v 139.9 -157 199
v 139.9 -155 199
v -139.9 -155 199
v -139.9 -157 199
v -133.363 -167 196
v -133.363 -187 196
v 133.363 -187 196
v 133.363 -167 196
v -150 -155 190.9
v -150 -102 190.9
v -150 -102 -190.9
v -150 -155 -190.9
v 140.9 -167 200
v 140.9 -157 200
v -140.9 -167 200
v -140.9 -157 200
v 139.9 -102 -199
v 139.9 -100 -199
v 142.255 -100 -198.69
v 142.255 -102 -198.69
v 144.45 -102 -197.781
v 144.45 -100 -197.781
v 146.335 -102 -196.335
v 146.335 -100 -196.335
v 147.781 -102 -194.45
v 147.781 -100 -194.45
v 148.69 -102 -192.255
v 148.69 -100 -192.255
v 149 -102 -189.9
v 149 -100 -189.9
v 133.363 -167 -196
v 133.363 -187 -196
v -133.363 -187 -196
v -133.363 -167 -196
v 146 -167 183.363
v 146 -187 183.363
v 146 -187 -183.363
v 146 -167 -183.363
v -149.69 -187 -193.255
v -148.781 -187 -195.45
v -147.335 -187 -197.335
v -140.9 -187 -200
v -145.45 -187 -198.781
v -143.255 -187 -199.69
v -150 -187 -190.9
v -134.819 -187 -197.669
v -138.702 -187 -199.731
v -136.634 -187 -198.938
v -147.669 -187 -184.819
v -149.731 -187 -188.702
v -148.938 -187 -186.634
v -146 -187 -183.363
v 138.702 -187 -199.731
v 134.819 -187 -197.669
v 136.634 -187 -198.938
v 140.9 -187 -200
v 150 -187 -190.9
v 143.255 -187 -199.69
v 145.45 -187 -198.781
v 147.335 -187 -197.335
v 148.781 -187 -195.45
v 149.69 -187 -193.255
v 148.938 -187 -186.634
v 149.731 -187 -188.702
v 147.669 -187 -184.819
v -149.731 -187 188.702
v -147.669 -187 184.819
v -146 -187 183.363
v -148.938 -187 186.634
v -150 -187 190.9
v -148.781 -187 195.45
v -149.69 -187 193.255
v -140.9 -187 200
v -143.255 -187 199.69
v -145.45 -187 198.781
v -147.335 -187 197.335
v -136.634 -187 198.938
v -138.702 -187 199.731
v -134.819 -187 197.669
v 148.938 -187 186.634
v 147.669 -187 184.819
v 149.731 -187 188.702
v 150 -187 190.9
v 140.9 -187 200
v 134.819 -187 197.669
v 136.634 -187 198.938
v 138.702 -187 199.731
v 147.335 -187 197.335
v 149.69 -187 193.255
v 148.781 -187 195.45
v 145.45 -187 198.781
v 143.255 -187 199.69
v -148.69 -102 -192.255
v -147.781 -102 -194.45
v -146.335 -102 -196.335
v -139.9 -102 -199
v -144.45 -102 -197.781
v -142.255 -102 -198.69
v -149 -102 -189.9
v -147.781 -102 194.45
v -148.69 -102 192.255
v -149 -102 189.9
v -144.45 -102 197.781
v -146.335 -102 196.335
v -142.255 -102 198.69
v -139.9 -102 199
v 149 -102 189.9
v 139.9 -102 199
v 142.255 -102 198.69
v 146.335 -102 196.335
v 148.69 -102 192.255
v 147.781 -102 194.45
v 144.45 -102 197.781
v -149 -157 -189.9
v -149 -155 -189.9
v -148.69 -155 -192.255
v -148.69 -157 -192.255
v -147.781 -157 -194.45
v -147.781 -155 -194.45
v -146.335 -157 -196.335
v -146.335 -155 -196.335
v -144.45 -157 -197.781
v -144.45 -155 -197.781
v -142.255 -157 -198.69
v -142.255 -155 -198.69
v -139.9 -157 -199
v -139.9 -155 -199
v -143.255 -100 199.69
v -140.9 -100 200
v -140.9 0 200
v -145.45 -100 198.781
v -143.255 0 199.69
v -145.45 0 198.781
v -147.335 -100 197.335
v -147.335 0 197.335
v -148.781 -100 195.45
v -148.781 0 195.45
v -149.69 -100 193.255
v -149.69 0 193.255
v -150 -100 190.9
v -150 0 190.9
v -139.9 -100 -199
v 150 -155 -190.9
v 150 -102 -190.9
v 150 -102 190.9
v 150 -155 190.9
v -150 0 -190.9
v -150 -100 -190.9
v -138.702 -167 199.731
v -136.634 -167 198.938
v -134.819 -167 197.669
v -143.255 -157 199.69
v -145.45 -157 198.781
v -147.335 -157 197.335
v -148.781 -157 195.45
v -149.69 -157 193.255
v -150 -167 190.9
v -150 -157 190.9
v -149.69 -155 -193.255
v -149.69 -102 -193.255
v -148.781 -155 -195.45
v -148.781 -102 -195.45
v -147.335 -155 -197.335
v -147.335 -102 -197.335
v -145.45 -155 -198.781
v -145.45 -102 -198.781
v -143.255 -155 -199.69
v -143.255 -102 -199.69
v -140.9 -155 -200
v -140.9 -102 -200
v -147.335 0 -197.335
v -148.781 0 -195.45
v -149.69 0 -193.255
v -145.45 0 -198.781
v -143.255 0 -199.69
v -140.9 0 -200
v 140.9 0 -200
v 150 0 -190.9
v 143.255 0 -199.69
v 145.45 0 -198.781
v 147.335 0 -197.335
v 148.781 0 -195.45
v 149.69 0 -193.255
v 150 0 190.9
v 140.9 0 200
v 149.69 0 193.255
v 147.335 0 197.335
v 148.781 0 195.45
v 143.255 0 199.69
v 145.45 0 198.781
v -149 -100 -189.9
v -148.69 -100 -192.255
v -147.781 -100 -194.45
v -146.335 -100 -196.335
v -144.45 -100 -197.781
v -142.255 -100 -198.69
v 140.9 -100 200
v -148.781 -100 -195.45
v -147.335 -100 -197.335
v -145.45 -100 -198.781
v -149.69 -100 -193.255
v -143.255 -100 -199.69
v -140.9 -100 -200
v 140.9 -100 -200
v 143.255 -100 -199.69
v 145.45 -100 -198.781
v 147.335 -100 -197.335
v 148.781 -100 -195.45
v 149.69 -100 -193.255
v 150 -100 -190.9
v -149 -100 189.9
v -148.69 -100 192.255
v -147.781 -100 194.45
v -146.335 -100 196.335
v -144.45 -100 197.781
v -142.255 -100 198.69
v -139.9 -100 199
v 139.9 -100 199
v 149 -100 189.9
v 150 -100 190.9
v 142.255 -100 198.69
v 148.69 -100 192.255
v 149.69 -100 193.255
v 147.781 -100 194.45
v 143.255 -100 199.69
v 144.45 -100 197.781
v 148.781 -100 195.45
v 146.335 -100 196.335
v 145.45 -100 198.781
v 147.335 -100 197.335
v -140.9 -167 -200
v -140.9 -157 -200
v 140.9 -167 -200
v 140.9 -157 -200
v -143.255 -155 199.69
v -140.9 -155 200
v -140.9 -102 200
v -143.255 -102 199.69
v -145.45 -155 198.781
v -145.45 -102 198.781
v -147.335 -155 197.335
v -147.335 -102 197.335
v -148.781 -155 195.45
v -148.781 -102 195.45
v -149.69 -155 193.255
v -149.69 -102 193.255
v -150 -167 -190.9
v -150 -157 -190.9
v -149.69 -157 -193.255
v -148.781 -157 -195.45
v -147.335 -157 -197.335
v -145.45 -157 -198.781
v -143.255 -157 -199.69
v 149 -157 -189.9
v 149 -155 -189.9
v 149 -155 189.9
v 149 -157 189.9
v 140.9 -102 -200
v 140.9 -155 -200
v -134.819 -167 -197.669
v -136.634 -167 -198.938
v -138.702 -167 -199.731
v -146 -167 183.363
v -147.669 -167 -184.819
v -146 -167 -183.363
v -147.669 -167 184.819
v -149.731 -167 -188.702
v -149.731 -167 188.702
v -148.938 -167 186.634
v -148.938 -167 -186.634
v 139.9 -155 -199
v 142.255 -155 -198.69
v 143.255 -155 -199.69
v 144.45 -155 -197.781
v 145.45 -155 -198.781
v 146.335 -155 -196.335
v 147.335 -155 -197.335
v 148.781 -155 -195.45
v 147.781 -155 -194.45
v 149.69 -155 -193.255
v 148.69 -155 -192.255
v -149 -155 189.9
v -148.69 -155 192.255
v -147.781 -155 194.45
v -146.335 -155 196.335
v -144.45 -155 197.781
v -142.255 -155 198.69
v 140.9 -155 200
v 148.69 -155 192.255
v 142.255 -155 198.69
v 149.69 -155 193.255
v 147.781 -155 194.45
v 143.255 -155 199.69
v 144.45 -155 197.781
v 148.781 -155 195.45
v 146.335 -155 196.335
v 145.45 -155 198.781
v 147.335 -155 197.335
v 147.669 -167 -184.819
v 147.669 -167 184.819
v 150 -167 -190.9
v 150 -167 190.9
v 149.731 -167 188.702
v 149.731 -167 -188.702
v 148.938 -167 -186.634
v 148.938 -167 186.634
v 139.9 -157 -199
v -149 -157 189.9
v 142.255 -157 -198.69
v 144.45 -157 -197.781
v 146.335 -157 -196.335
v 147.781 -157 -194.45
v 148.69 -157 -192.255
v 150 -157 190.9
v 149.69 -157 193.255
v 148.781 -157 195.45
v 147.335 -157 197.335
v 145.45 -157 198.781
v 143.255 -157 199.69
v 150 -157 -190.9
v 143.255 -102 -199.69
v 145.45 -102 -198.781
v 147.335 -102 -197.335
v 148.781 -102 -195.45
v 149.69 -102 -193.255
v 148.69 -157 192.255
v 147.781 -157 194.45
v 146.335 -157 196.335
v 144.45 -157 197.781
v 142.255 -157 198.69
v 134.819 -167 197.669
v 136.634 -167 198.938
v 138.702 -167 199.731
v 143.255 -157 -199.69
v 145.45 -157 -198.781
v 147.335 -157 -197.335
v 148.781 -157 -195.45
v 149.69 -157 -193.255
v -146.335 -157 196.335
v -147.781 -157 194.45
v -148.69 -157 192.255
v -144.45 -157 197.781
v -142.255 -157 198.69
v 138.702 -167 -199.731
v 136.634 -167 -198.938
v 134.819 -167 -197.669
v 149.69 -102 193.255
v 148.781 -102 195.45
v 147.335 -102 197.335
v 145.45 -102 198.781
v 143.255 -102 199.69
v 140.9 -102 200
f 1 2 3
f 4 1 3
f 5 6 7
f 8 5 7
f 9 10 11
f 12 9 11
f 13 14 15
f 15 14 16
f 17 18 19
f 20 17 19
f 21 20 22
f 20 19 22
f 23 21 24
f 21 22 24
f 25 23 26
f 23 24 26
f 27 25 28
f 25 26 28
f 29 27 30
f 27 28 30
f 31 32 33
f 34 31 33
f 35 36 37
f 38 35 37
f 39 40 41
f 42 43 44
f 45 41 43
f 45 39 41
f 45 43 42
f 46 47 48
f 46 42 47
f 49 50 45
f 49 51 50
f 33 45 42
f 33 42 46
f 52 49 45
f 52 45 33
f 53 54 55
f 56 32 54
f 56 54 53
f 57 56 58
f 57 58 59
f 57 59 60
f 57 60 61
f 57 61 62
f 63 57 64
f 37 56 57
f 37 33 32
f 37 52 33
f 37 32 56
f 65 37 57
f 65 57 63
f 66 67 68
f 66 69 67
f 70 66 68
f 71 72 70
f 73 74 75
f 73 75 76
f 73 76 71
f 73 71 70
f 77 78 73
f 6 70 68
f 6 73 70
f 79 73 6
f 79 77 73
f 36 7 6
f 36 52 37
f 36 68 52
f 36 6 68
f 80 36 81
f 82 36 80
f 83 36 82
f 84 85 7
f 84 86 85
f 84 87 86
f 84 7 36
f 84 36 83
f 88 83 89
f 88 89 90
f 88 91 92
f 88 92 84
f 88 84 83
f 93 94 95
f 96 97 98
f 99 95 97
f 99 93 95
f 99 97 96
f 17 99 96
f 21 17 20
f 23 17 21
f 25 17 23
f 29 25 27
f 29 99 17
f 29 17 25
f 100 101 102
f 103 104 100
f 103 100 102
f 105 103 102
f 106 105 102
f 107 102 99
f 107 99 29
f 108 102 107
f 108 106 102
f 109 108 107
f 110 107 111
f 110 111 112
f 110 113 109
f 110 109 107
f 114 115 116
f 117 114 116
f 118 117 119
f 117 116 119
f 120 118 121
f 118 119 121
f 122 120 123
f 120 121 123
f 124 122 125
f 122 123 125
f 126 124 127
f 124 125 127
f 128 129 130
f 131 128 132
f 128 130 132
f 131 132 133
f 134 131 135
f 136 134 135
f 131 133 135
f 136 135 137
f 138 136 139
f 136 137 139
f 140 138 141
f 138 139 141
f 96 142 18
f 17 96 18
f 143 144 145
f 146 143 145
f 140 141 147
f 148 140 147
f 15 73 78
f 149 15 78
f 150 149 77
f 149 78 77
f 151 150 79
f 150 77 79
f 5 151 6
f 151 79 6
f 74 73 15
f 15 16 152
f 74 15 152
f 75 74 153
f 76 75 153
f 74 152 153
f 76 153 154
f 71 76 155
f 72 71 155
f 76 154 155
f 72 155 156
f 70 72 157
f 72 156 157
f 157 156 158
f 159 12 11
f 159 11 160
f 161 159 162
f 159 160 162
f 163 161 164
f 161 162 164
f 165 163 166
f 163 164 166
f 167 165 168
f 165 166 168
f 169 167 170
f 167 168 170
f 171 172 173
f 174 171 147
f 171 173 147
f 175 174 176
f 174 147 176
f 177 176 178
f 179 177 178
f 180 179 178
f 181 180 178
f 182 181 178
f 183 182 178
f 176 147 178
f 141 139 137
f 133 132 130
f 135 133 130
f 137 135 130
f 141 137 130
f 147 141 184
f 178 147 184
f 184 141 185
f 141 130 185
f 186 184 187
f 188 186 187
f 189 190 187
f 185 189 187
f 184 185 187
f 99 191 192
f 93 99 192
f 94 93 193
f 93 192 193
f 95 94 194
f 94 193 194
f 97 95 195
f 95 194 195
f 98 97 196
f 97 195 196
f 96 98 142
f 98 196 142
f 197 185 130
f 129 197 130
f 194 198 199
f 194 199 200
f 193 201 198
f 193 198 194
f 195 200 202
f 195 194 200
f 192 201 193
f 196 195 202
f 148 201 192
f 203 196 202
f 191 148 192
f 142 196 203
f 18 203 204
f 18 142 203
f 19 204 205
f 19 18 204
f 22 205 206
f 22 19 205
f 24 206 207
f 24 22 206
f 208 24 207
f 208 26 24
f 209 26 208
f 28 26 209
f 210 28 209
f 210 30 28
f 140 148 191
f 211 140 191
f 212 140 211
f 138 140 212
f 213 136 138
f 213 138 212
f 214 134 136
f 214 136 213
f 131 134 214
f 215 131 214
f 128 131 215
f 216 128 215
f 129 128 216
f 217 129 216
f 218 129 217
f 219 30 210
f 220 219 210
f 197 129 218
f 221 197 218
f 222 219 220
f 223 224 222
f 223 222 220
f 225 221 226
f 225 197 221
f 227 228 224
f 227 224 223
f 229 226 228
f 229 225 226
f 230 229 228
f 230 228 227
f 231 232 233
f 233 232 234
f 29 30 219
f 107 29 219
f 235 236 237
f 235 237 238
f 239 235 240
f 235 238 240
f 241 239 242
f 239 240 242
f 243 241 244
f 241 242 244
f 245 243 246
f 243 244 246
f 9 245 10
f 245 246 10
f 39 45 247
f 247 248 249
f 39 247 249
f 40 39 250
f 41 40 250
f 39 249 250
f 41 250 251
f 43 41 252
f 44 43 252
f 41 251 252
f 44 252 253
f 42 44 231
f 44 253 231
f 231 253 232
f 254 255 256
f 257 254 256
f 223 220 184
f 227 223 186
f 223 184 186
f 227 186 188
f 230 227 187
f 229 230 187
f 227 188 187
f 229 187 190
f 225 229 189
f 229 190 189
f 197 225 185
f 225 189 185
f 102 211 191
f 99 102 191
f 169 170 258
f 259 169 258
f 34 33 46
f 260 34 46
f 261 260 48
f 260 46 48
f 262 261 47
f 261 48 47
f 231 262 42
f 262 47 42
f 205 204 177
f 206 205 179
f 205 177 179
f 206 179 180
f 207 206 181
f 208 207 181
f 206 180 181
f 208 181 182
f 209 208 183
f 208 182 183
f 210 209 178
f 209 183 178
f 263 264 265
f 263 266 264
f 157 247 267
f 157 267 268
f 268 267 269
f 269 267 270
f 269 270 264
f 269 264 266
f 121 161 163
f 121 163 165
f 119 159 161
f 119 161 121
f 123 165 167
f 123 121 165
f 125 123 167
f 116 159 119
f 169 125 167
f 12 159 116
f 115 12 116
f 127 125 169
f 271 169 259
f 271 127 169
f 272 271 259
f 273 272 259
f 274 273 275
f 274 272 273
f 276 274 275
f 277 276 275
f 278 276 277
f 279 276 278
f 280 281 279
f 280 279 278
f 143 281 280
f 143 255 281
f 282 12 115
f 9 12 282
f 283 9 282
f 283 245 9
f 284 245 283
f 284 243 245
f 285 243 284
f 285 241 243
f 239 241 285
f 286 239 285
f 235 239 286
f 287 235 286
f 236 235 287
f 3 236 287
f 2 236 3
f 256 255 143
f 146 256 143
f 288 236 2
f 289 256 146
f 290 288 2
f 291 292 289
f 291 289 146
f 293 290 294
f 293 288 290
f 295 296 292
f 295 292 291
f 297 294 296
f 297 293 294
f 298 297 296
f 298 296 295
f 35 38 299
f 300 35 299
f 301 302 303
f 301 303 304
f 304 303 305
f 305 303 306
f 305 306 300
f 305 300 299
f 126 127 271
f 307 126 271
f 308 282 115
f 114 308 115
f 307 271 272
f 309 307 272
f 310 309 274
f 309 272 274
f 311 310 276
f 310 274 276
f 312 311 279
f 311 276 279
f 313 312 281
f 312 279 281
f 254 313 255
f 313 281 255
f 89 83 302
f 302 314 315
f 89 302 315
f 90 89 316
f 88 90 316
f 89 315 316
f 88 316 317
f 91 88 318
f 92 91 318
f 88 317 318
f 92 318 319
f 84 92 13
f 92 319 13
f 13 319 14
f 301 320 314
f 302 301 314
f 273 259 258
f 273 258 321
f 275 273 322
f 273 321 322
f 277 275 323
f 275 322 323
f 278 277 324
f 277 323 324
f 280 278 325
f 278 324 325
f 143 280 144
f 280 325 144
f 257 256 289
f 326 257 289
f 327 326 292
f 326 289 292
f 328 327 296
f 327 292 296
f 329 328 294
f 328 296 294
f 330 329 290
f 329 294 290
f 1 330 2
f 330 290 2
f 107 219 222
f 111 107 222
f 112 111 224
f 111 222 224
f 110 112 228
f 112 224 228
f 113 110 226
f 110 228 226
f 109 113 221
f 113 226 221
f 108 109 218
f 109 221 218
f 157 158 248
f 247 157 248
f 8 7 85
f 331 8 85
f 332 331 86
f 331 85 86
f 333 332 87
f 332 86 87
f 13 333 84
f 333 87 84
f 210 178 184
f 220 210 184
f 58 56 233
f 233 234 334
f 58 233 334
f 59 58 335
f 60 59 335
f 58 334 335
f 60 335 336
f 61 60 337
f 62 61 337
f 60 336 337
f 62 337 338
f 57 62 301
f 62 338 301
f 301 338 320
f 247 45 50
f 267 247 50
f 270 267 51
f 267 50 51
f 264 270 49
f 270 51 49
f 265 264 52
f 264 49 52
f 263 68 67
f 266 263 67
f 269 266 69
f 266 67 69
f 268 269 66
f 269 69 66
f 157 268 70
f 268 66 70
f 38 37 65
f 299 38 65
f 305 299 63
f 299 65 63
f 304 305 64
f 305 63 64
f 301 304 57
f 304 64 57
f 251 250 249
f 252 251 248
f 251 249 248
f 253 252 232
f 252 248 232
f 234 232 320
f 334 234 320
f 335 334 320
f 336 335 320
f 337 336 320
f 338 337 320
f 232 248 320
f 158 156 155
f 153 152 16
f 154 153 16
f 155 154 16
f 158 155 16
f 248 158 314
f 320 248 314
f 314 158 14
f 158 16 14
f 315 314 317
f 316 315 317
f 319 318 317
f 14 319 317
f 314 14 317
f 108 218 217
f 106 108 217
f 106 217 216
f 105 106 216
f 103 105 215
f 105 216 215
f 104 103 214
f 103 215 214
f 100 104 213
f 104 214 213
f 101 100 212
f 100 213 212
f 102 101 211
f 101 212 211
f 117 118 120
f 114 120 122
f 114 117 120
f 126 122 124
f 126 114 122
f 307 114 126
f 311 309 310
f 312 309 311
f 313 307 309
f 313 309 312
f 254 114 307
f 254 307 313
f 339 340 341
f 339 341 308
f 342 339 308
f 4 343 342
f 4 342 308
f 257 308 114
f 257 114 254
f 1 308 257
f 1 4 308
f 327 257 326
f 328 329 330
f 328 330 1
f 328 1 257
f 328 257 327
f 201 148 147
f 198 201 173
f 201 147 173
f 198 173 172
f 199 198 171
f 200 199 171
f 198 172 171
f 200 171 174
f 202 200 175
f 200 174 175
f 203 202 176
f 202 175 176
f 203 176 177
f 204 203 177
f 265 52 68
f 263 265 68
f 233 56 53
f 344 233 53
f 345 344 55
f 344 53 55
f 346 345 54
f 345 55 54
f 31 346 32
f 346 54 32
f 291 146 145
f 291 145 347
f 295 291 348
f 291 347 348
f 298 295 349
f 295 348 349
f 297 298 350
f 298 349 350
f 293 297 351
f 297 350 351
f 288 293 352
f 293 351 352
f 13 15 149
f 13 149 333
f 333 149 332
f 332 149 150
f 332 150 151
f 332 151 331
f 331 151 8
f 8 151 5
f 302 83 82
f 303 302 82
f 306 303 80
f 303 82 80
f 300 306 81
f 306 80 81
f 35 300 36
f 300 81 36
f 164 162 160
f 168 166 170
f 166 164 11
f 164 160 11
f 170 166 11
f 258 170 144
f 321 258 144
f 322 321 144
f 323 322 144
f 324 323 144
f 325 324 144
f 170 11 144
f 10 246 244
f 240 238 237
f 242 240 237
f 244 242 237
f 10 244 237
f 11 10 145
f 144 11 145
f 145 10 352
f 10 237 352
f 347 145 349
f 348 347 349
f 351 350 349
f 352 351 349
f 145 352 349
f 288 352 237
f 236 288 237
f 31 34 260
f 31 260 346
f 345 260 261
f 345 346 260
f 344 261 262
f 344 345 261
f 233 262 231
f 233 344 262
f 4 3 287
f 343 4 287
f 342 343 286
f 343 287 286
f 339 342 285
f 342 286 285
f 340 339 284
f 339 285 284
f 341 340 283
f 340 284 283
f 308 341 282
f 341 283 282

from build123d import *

# Parameters (mm, degrees)
F1_DEPTH  = 100
F3_DEPTH  = 2
F5_DEPTH  = 53
F7_DEPTH  = 2
F8_W      = 290
F8_H      = 390
F9_DEPTH  = 30
F11_DEPTH = 20


with BuildPart() as f1:
    # F0 (on Front) → F1 (new body)
    with BuildSketch(Plane.XZ):
        with BuildLine():
            Line((140.9, 200), (-140.9, 200))
            ThreePointArc((-140.9, 200), (-147.334672, 197.334672), (-150, 190.9))
            Line((-150, 190.9), (-150, -190.9))
            ThreePointArc((-150, -190.9), (-147.334672, -197.334672), (-140.9, -200))
            Line((-140.9, -200), (140.9, -200))
            ThreePointArc((140.9, -200), (147.334672, -197.334672), (150, -190.9))
            Line((150, -190.9), (150, 190.9))
            ThreePointArc((150, 190.9), (147.334672, 197.334672), (140.9, 200))
        make_face()
    extrude(amount=F1_DEPTH)

    # F2 (on face) → F3 (join)
    with BuildSketch(Plane.XZ.offset(100)):
        with BuildLine():
            ThreePointArc((149, 189.9), (146.334672, 196.334672), (139.9, 199))
            Line((139.9, 199), (-139.9, 199))
            ThreePointArc((-139.9, 199), (-146.334672, 196.334672), (-149, 189.9))
            Line((-149, 189.9), (-149, -189.9))
            ThreePointArc((-149, -189.9), (-146.334672, -196.334672), (-139.9, -199))
            Line((-139.9, -199), (139.9, -199))
            ThreePointArc((139.9, -199), (146.334672, -196.334672), (149, -189.9))
            Line((149, -189.9), (149, 189.9))
        make_face()
    extrude(amount=F3_DEPTH)


with BuildPart() as f5:
    # F4 (on face) → F5 (new body)
    with BuildSketch(Plane.XZ.offset(102)):
        with BuildLine():
            Line((-150, 190.9), (-150, -190.9))
            ThreePointArc((-150, -190.9), (-147.334672, -197.334672), (-140.9, -200))
            Line((-140.9, -200), (140.9, -200))
            ThreePointArc((140.9, -200), (147.334672, -197.334672), (150, -190.9))
            Line((150, -190.9), (150, 190.9))
            ThreePointArc((150, 190.9), (147.334672, 197.334672), (140.9, 200))
            Line((140.9, 200), (-140.9, 200))
            ThreePointArc((-140.9, 200), (-147.334672, 197.334672), (-150, 190.9))
        make_face()
        with BuildLine():
            ThreePointArc((139.9, 199), (146.334672, 196.334672), (149, 189.9))
            Line((149, 189.9), (149, -189.9))
            ThreePointArc((149, -189.9), (146.334672, -196.334672), (139.9, -199))
            Line((139.9, -199), (-139.9, -199))
            ThreePointArc((-139.9, -199), (-146.334672, -196.334672), (-149, -189.9))
            Line((-149, -189.9), (-149, 189.9))
            ThreePointArc((-149, 189.9), (-146.334672, 196.334672), (-139.9, 199))
            Line((-139.9, 199), (139.9, 199))
        make_face(mode=Mode.SUBTRACT)
        with BuildLine():
            Line((149, -189.9), (149, 189.9))
            ThreePointArc((149, 189.9), (146.334672, 196.334672), (139.9, 199))
            Line((139.9, 199), (-139.9, 199))
            ThreePointArc((-139.9, 199), (-146.334672, 196.334672), (-149, 189.9))
            Line((-149, 189.9), (-149, -189.9))
            ThreePointArc((-149, -189.9), (-146.334672, -196.334672), (-139.9, -199))
            Line((-139.9, -199), (139.9, -199))
            ThreePointArc((139.9, -199), (146.334672, -196.334672), (149, -189.9))
        make_face()
    extrude(amount=F5_DEPTH)

    # F6 (on face) → F7 (join)
    with BuildSketch(Plane.XZ.offset(155)):
        with BuildLine():
            Line((139.9, 199), (-139.9, 199))
            ThreePointArc((-139.9, 199), (-146.334672, 196.334672), (-149, 189.9))
            Line((-149, 189.9), (-149, -189.9))
            ThreePointArc((-149, -189.9), (-146.334672, -196.334672), (-139.9, -199))
            Line((-139.9, -199), (139.9, -199))
            ThreePointArc((139.9, -199), (146.334672, -196.334672), (149, -189.9))
            Line((149, -189.9), (149, 189.9))
            ThreePointArc((149, 189.9), (146.334672, 196.334672), (139.9, 199))
        make_face()
    extrude(amount=F7_DEPTH)


with BuildPart() as f9:
    # F8 (on face) → F9 (new body)
    with BuildSketch(Plane.XZ.offset(157)):
        with BuildLine():
            Line((140.9, 200), (-140.9, 200))
            ThreePointArc((-140.9, 200), (-147.334672, 197.334672), (-150, 190.9))
            Line((-150, 190.9), (-150, -190.9))
            ThreePointArc((-150, -190.9), (-147.334672, -197.334672), (-140.9, -200))
            Line((-140.9, -200), (140.9, -200))
            ThreePointArc((140.9, -200), (147.334672, -197.334672), (150, -190.9))
            Line((150, -190.9), (150, 190.9))
            ThreePointArc((150, 190.9), (147.334672, 197.334672), (140.9, 200))
        make_face()
        with BuildLine():
            Line((-139.9, 199), (139.9, 199))
            ThreePointArc((139.9, 199), (146.334672, 196.334672), (149, 189.9))
            Line((149, 189.9), (149, -189.9))
            ThreePointArc((149, -189.9), (146.334672, -196.334672), (139.9, -199))
            Line((139.9, -199), (-139.9, -199))
            ThreePointArc((-139.9, -199), (-146.334672, -196.334672), (-149, -189.9))
            Line((-149, -189.9), (-149, 189.9))
            ThreePointArc((-149, 189.9), (-146.334672, 196.334672), (-139.9, 199))
        make_face(mode=Mode.SUBTRACT)
        with BuildLine():
            ThreePointArc((149, 189.9), (146.334672, 196.334672), (139.9, 199))
            Line((139.9, 199), (-139.9, 199))
            ThreePointArc((-139.9, 199), (-146.334672, 196.334672), (-149, 189.9))
            Line((-149, 189.9), (-149, -189.9))
            ThreePointArc((-149, -189.9), (-146.334672, -196.334672), (-139.9, -199))
            Line((-139.9, -199), (139.9, -199))
            ThreePointArc((139.9, -199), (146.334672, -196.334672), (149, -189.9))
            Line((149, -189.9), (149, 189.9))
        make_face()
        Rectangle(F8_W, F8_H, mode=Mode.SUBTRACT)
        Rectangle(F8_W, F8_H)
    extrude(amount=F9_DEPTH)

    # F10 (on face) → F11 (cut)
    with BuildSketch(Plane.XZ.offset(187)):
        with BuildLine():
            Line((133, 200), (-133, 200))
            Line((-133, 200), (-140.9, 200))
            ThreePointArc((-140.9, 200), (-136.633854, 198.938035), (-133.363423, 196))
            Line((-133.363423, 196), (133.363423, 196))
            ThreePointArc((133.363423, 196), (136.633854, 198.938035), (140.9, 200))
            Line((140.9, 200), (133, 200))
        make_face()
        with BuildLine():
            ThreePointArc((-146, 183.363423), (-148.938035, 186.633854), (-150, 190.9))
            Line((-150, 190.9), (-150, -190.9))
            ThreePointArc((-150, -190.9), (-148.938035, -186.633854), (-146, -183.363423))
            Line((-146, -183.363423), (-146, 183.363423))
        make_face()
        with BuildLine():
            Line((150, -190.9), (150, 190.9))
            ThreePointArc((150, 190.9), (148.938035, 186.633854), (146, 183.363423))
            Line((146, 183.363423), (146, -183.363423))
            ThreePointArc((146, -183.363423), (148.938035, -186.633854), (150, -190.9))
        make_face()
        with BuildLine():
            ThreePointArc((-133.363423, -196), (-136.633854, -198.938035), (-140.9, -200))
            Line((-140.9, -200), (140.9, -200))
            ThreePointArc((140.9, -200), (136.633854, -198.938035), (133.363423, -196))
            Line((133.363423, -196), (-133.363423, -196))
        make_face()
    extrude(amount=-F11_DEPTH, mode=Mode.SUBTRACT)


solid = Compound([f1.part, f5.part, f9.part])
